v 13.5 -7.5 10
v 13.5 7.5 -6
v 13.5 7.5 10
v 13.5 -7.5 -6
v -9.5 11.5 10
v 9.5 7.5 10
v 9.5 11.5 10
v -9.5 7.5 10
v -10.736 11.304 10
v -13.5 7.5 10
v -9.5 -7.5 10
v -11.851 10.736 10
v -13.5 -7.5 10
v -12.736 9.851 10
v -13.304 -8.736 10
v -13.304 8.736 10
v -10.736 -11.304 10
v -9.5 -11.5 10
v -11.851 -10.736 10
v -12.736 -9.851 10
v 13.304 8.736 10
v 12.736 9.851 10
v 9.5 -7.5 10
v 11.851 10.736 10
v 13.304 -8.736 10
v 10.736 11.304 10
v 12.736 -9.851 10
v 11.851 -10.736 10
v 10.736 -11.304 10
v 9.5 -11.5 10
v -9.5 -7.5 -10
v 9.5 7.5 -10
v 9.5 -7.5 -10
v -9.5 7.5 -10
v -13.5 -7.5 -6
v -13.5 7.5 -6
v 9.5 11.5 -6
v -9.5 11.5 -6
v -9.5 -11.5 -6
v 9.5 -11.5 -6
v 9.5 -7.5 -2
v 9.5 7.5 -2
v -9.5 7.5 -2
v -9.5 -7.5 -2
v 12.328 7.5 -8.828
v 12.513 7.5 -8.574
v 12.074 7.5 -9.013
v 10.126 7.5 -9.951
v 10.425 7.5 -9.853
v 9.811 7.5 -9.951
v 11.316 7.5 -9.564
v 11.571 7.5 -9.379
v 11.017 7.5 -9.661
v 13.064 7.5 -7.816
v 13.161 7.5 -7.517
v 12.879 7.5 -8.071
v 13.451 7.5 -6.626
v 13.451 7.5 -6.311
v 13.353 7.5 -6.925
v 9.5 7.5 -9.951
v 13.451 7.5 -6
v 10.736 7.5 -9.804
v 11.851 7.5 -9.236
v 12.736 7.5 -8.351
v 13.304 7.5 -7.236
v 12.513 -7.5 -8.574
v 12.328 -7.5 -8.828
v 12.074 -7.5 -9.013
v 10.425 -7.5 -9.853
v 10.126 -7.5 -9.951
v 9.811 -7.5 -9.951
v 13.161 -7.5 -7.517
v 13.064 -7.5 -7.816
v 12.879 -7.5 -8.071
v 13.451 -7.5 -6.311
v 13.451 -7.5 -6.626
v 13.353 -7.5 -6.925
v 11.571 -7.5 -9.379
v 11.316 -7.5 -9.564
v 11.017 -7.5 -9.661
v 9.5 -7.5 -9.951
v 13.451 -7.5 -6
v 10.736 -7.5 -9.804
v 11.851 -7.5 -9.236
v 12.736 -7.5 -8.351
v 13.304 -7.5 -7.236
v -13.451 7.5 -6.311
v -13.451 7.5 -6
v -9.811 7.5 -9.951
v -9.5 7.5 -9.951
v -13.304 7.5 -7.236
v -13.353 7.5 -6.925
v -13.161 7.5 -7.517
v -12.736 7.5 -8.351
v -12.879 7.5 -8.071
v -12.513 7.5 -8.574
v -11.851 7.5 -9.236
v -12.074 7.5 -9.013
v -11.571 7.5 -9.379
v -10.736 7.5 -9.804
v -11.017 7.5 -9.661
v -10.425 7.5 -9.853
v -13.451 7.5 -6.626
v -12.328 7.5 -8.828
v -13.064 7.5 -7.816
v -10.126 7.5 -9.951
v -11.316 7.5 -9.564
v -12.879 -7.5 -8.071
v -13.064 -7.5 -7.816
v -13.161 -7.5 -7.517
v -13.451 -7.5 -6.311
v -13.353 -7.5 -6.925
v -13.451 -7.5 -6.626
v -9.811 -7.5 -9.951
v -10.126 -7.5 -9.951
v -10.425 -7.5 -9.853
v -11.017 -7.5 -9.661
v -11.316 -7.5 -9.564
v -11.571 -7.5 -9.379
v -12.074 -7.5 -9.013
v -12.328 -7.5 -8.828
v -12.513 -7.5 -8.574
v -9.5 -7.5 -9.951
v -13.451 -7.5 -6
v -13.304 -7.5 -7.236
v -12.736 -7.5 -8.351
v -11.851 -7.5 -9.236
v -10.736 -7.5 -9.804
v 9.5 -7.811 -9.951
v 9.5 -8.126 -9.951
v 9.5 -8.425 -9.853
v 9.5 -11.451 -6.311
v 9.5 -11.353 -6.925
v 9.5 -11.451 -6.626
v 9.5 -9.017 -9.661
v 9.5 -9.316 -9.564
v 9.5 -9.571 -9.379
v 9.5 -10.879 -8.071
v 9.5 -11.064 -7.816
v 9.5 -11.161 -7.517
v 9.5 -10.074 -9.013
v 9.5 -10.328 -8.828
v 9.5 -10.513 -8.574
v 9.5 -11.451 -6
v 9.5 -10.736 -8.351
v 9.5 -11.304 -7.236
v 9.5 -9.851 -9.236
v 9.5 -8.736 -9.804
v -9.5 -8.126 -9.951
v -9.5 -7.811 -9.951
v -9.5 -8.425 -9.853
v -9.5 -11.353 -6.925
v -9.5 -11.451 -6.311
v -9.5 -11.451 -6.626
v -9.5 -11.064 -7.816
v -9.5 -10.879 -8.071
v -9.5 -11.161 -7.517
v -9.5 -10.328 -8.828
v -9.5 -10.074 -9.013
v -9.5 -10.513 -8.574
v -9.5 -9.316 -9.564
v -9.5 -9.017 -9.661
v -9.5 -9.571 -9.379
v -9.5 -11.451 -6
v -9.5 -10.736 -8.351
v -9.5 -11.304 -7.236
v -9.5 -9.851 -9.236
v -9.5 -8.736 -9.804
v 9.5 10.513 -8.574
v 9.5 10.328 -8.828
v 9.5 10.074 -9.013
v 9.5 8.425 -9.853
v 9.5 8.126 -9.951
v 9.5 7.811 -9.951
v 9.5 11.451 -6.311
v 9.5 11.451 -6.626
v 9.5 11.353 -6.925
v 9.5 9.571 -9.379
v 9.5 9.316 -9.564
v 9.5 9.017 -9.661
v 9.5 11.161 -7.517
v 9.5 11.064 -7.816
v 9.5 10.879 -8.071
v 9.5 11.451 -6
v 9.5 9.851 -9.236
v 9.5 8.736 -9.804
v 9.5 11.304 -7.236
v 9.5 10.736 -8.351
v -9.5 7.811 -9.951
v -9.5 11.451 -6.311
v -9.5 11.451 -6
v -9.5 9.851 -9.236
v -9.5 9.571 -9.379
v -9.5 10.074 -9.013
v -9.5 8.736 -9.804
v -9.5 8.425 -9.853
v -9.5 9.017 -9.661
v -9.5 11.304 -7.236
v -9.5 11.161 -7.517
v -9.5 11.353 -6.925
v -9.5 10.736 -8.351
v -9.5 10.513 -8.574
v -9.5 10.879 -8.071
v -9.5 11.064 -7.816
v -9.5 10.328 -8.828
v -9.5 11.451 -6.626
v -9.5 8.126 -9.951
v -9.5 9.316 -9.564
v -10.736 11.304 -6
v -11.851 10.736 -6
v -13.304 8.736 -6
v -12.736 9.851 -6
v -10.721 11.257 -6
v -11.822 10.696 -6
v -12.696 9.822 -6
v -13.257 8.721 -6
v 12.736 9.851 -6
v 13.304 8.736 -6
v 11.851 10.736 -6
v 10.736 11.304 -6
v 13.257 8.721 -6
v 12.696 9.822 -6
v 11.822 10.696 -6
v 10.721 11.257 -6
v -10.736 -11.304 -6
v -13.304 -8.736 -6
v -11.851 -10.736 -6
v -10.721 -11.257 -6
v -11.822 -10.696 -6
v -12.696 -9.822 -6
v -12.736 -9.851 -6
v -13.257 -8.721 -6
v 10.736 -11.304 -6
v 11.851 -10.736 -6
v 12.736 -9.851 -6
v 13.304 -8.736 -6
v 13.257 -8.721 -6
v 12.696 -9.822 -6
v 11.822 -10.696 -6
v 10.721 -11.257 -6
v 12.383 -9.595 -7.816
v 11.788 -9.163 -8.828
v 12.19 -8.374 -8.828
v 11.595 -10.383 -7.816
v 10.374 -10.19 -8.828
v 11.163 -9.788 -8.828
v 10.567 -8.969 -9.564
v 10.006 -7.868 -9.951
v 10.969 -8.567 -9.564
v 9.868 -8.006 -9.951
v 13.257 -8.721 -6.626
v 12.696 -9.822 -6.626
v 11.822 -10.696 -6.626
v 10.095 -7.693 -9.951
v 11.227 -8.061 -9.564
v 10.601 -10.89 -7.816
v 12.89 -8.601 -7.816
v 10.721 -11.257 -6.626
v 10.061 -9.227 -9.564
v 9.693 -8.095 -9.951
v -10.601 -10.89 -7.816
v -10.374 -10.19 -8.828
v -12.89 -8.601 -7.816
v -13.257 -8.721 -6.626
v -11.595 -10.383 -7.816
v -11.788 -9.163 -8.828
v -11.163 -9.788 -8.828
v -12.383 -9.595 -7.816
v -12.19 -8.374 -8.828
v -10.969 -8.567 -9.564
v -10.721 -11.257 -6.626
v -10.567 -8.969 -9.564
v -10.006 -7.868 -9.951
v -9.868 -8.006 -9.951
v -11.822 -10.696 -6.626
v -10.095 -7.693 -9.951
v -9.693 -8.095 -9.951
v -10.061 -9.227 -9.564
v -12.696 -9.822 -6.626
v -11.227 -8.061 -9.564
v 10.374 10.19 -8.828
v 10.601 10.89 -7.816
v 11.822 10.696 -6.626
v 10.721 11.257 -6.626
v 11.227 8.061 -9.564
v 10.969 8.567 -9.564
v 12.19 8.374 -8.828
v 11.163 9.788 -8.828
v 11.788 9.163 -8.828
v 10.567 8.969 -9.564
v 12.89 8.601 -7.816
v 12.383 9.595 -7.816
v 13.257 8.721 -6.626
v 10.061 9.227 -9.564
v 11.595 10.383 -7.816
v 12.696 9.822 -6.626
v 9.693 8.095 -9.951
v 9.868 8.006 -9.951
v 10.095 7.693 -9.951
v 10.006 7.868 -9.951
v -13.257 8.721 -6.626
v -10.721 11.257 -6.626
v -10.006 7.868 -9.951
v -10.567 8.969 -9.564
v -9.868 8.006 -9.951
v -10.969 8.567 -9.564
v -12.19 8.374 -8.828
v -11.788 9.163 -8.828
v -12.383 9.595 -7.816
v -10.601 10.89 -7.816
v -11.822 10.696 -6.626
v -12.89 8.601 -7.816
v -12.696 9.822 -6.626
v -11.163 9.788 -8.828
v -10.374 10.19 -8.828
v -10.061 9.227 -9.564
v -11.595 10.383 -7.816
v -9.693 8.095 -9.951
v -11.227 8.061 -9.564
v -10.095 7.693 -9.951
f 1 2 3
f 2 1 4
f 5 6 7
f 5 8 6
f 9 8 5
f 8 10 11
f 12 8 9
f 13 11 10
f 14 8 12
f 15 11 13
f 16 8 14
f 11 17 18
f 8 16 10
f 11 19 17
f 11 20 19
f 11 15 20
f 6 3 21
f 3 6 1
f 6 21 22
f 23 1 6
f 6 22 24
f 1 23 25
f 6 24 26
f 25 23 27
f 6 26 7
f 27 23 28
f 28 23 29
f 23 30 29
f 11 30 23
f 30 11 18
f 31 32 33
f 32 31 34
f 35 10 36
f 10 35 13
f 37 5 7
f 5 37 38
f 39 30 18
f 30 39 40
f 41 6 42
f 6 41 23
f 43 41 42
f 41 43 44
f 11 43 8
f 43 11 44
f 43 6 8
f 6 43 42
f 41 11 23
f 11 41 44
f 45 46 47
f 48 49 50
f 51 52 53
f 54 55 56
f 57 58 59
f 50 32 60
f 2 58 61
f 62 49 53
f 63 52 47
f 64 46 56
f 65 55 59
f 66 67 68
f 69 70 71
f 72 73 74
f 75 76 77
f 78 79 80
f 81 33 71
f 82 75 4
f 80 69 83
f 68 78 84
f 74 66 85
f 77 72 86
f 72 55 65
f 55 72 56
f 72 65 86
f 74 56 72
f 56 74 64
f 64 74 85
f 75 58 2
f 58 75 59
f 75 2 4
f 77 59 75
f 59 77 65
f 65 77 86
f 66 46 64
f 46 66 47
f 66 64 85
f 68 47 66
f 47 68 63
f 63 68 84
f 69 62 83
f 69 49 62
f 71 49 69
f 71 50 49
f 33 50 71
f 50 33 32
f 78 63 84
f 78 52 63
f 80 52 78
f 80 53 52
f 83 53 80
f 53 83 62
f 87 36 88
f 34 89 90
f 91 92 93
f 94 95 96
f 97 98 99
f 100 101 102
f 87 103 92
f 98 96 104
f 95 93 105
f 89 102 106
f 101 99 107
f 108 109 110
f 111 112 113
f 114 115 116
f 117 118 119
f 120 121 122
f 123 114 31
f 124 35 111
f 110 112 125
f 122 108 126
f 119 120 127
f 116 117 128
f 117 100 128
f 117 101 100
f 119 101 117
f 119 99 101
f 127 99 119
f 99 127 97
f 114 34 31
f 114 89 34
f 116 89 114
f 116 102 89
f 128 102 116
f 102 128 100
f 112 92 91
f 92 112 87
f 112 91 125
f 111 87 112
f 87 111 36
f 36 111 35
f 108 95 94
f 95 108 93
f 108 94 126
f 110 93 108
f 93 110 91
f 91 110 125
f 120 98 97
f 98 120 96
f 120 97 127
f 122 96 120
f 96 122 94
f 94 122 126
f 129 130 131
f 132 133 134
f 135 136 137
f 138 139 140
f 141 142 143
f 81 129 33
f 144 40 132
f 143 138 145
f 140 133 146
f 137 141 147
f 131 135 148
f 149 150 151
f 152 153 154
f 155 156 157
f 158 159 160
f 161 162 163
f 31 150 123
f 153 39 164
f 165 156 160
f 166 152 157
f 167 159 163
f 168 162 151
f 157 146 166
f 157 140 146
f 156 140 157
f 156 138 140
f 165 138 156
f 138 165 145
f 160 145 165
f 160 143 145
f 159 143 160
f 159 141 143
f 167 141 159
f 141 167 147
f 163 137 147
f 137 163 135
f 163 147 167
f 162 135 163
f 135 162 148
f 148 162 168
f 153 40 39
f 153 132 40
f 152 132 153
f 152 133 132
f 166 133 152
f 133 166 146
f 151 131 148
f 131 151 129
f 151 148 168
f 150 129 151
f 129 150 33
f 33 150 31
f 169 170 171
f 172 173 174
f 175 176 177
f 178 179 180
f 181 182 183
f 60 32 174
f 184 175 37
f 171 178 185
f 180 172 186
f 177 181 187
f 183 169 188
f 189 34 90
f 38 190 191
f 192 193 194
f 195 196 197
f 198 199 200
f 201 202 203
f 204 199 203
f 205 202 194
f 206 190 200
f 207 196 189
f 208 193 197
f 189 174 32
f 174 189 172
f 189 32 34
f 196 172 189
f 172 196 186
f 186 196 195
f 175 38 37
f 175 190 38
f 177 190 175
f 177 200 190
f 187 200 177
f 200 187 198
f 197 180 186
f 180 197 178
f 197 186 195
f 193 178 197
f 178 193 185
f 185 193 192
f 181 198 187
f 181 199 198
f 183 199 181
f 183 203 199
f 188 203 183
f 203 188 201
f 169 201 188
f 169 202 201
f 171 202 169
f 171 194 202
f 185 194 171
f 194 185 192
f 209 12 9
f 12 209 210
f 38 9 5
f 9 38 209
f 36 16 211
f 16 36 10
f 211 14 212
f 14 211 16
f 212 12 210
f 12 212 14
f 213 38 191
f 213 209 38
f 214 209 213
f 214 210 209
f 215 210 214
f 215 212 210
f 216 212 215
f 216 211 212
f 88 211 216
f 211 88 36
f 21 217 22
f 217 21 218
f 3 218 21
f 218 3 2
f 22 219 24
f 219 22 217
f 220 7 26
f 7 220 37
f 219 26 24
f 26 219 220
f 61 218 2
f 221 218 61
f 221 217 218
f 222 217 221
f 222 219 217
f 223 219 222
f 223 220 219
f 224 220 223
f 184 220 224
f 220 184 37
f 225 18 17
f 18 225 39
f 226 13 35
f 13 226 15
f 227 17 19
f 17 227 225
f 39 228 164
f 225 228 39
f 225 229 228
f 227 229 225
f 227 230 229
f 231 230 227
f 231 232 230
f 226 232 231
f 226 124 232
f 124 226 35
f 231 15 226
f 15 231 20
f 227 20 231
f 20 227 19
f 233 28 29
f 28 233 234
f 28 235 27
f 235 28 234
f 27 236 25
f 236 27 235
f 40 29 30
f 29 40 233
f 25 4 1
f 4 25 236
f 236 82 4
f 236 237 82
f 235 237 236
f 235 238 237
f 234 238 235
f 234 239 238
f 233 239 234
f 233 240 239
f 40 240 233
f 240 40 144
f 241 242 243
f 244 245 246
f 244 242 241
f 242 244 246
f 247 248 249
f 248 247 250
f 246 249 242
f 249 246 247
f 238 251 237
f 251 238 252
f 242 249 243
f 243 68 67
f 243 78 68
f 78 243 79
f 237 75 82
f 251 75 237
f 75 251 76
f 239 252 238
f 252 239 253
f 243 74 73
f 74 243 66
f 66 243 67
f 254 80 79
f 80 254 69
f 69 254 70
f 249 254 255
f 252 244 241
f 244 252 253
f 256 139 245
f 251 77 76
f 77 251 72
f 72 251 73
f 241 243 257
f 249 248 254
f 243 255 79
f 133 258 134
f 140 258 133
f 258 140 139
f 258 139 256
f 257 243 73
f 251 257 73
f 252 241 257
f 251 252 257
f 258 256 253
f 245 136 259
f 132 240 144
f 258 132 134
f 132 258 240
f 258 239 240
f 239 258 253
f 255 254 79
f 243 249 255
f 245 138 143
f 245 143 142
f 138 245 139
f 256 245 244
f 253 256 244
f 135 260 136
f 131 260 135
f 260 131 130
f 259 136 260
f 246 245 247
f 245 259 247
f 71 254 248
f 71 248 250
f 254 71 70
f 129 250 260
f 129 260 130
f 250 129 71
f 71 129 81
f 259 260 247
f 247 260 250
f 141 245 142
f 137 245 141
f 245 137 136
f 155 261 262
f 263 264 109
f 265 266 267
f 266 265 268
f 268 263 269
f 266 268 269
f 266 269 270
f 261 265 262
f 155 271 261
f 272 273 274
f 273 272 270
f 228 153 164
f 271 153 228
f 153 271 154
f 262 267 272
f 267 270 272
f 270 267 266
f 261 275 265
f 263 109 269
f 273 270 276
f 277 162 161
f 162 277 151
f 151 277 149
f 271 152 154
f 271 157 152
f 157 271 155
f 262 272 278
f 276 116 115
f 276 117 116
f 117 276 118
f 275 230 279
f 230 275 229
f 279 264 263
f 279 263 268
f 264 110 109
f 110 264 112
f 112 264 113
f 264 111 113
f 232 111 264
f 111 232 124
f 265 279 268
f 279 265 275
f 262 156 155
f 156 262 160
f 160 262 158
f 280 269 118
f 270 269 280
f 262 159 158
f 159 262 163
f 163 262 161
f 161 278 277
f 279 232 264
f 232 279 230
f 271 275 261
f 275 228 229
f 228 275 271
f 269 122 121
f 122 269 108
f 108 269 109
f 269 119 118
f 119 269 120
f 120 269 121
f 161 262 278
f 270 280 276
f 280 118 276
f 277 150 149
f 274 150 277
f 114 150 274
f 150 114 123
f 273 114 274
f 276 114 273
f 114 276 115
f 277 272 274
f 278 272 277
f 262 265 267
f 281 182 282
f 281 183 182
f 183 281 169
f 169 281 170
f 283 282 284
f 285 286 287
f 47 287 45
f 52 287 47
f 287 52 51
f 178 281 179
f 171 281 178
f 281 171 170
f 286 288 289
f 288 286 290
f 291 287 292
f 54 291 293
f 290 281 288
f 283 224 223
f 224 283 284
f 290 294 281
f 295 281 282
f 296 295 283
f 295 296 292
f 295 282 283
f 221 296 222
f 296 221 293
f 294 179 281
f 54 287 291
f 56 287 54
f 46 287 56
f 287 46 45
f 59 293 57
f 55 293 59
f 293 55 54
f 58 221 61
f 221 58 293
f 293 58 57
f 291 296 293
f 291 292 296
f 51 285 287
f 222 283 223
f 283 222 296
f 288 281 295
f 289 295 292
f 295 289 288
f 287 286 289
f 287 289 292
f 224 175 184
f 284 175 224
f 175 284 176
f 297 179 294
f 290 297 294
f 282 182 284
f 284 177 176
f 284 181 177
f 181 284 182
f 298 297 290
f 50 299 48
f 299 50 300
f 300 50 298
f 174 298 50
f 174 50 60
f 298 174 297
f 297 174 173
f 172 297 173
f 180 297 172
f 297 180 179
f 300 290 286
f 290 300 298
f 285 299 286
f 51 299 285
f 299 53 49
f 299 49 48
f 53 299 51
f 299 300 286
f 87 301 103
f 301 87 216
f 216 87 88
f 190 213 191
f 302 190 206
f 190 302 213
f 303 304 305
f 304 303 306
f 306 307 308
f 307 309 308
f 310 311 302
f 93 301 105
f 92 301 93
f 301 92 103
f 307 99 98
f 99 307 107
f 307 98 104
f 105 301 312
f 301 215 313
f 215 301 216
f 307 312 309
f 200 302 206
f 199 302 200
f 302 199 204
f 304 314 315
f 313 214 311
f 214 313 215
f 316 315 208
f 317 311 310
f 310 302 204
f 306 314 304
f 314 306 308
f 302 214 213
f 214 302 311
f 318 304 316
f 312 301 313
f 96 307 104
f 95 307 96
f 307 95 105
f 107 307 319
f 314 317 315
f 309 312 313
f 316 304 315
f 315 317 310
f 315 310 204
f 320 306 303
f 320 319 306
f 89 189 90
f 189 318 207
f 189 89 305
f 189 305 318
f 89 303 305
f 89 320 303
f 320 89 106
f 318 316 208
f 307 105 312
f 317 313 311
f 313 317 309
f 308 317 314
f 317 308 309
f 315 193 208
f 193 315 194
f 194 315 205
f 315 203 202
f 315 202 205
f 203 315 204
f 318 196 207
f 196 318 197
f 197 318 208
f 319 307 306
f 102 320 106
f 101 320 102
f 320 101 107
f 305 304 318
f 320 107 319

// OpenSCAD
$fn = 20;


//Simple Box with Rounded Edges

// DECLARE BOX PARAMETERS:
boxOuterL = 27;
boxOuterW = 23;
boxOuterH = 20;
wallThickness=4;
//'natural fillet'; fillet radius = wall Thickness
filletRadius = wallThickness;


boxInnerL = boxOuterL-wallThickness*2;
boxInnerW = boxOuterW-wallThickness*2;
boxInnerH = boxOuterH-wallThickness*2;
baseWidth = wallThickness;
OBsize = [boxOuterL,boxOuterW,boxOuterH];
IBsize = [boxInnerL,boxInnerW,boxInnerH];
difference(){
    difference(){
        cube(size=OBsize,center=true);
        translate([0,0,baseWidth]){
            cube(size=IBsize,center=true);};
    };
    
    translate([0.5*(boxInnerL),0.5*(boxInnerW),-0.5*(boxInnerH+2*wallThickness)]){cube(size=[wallThickness,wallThickness,boxOuterH]);};
    
    translate([-0.5*(boxInnerL)-wallThickness,-0.5*(boxInnerW)-wallThickness,-0.5*(boxInnerH+2*wallThickness)]){cube(size=[wallThickness,wallThickness,boxOuterH]);};
    
    translate([-0.5*(boxInnerL)-wallThickness,0.5*(boxInnerW),-0.5*(boxInnerH+2*wallThickness)]){cube(size=[wallThickness,wallThickness,boxOuterH]);};    
    
    translate([0.5*(boxInnerL),-0.5*(boxInnerW)-wallThickness,-0.5*(boxInnerH+2*wallThickness)]){cube(size=[wallThickness,wallThickness,boxOuterH]);};

    translate([-0.5*boxInnerL-wallThickness,-0.5*(boxInnerW)-wallThickness,-0.5*(boxInnerH+2*wallThickness)]){cube(size=[boxOuterL,wallThickness,wallThickness]);};

    translate([-0.5*boxInnerL-wallThickness,0.5*(boxInnerW),-0.5*(boxInnerH+2*wallThickness)]){cube(size=[boxOuterL,wallThickness,wallThickness]);};
    
    translate([-0.5*boxInnerL-wallThickness,-0.5*(boxInnerW)-wallThickness,-0.5*(boxInnerH+2*wallThickness)]){cube(size=[wallThickness,boxOuterW,wallThickness]);};
    
    translate([0.5*boxInnerL,-0.5*(boxInnerW)-wallThickness,-0.5*(boxInnerH+2*wallThickness)]){cube(size=[wallThickness,boxOuterW,wallThickness]);};
};
intersection(){
    translate([0.5*boxInnerL,-0.5*(boxInnerW),-0.5*(boxInnerH+2*wallThickness)]){cube(size=[wallThickness,boxOuterW-wallThickness*2,wallThickness]);};
    
    translate([0.5*boxInnerL,-0.5*(boxInnerW)-wallThickness,-0.5*(boxInnerH)])rotate([-90,0,0]) cylinder(h = boxOuterW,r1 = filletRadius,r2 = filletRadius);
};
    
intersection(){
    translate([-0.5*boxInnerL-wallThickness,-0.5*(boxInnerW),-0.5*(boxInnerH+2*wallThickness)]){cube(size=[wallThickness,boxOuterW-wallThickness*2,wallThickness]);};
    
    translate([-0.5*boxInnerL,-0.5*(boxInnerW)-wallThickness,-0.5*(boxInnerH)])rotate([-90,0,0]) cylinder(h = boxOuterW,r1 = filletRadius,r2 = filletRadius);
};

intersection(){
    translate([-0.5*boxInnerL,-0.5*(boxInnerW)-wallThickness,-0.5*(boxInnerH+2*wallThickness)]){cube(size=[boxOuterL-2*wallThickness,wallThickness,wallThickness]);};
    
    translate([-0.5*boxInnerL-wallThickness,-0.5*(boxInnerW),-0.5*(boxInnerH)])rotate([0,90,0]) cylinder(h = boxOuterL,r1 = filletRadius,r2 = filletRadius);
};

intersection(){
    translate([-0.5*boxInnerL,0.5*(boxInnerW),-0.5*(boxInnerH+2*wallThickness)]){cube(size=[boxOuterL-2*wallThickness,wallThickness,wallThickness]);};
    
    translate([-0.5*boxInnerL-wallThickness,0.5*(boxInnerW),-0.5*(boxInnerH)])rotate([0,90,0]) cylinder(h = boxOuterL,r1 = filletRadius,r2 = filletRadius);
};

intersection(){
    translate([-0.5*boxInnerL-wallThickness,0.5*(boxInnerW),-0.5*(boxInnerH+2*wallThickness)]){cube(size=[wallThickness,wallThickness,boxOuterH]);};
    
    translate([-0.5*boxInnerL,0.5*(boxInnerW),-0.5*(boxInnerH)])cylinder(h = boxOuterH,r1 = filletRadius,r2 = filletRadius);
};
intersection(){
    translate([0.5*boxInnerL,0.5*(boxInnerW),-0.5*(boxInnerH+2*wallThickness)]){cube(size=[wallThickness,wallThickness,boxOuterH]);};
    
    translate([0.5*boxInnerL,0.5*(boxInnerW),-0.5*(boxInnerH)])cylinder(h = boxOuterH,r1 = filletRadius,r2 = filletRadius);
};
intersection(){
    translate([-0.5*boxInnerL-wallThickness,-0.5*(boxInnerW)-wallThickness,-0.5*(boxInnerH+2*wallThickness)]){cube(size=[wallThickness,wallThickness,boxOuterH]);};
    
    translate([-0.5*boxInnerL,-0.5*(boxInnerW),-0.5*(boxInnerH)])cylinder(h = boxOuterH,r1 = filletRadius,r2 = filletRadius);
};
intersection(){
    translate([0.5*boxInnerL,-0.5*(boxInnerW)-wallThickness,-0.5*(boxInnerH+2*wallThickness)]){cube(size=[wallThickness,wallThickness,boxOuterH]);};
    
    translate([0.5*boxInnerL,-0.5*(boxInnerW),-0.5*(boxInnerH)])cylinder(h = boxOuterH,r1 = filletRadius,r2 = filletRadius);
};

intersection(){
    translate([0.5*boxInnerL,-0.5*(boxInnerW)-wallThickness,-0.5*(boxInnerH+2*wallThickness)]){cube(size=[wallThickness,wallThickness,boxOuterH]);};
    
    translate([0.5*boxInnerL,-0.5*(boxInnerW),-0.5*(boxInnerH)])sphere(r = filletRadius,center = true);
};

intersection(){
    translate([-0.5*boxInnerL-wallThickness,-0.5*(boxInnerW)-wallThickness,-0.5*(boxInnerH+2*wallThickness)]){cube(size=[wallThickness,wallThickness,boxOuterH]);};
    
    translate([-0.5*boxInnerL,-0.5*(boxInnerW),-0.5*(boxInnerH)])sphere(r = filletRadius,center = true);
};
intersection(){
    translate([0.5*boxInnerL,0.5*(boxInnerW),-0.5*(boxInnerH+2*wallThickness)]){cube(size=[wallThickness,wallThickness,boxOuterH]);};
    
    translate([0.5*boxInnerL,0.5*(boxInnerW),-0.5*(boxInnerH)])sphere(r = filletRadius,center = true);
};

intersection(){
    translate([-0.5*boxInnerL-wallThickness,0.5*(boxInnerW),-0.5*(boxInnerH+2*wallThickness)]){cube(size=[wallThickness,wallThickness,boxOuterH]);};
    
    translate([-0.5*boxInnerL,0.5*(boxInnerW),-0.5*(boxInnerH)])sphere(r = filletRadius,center = true);
};
